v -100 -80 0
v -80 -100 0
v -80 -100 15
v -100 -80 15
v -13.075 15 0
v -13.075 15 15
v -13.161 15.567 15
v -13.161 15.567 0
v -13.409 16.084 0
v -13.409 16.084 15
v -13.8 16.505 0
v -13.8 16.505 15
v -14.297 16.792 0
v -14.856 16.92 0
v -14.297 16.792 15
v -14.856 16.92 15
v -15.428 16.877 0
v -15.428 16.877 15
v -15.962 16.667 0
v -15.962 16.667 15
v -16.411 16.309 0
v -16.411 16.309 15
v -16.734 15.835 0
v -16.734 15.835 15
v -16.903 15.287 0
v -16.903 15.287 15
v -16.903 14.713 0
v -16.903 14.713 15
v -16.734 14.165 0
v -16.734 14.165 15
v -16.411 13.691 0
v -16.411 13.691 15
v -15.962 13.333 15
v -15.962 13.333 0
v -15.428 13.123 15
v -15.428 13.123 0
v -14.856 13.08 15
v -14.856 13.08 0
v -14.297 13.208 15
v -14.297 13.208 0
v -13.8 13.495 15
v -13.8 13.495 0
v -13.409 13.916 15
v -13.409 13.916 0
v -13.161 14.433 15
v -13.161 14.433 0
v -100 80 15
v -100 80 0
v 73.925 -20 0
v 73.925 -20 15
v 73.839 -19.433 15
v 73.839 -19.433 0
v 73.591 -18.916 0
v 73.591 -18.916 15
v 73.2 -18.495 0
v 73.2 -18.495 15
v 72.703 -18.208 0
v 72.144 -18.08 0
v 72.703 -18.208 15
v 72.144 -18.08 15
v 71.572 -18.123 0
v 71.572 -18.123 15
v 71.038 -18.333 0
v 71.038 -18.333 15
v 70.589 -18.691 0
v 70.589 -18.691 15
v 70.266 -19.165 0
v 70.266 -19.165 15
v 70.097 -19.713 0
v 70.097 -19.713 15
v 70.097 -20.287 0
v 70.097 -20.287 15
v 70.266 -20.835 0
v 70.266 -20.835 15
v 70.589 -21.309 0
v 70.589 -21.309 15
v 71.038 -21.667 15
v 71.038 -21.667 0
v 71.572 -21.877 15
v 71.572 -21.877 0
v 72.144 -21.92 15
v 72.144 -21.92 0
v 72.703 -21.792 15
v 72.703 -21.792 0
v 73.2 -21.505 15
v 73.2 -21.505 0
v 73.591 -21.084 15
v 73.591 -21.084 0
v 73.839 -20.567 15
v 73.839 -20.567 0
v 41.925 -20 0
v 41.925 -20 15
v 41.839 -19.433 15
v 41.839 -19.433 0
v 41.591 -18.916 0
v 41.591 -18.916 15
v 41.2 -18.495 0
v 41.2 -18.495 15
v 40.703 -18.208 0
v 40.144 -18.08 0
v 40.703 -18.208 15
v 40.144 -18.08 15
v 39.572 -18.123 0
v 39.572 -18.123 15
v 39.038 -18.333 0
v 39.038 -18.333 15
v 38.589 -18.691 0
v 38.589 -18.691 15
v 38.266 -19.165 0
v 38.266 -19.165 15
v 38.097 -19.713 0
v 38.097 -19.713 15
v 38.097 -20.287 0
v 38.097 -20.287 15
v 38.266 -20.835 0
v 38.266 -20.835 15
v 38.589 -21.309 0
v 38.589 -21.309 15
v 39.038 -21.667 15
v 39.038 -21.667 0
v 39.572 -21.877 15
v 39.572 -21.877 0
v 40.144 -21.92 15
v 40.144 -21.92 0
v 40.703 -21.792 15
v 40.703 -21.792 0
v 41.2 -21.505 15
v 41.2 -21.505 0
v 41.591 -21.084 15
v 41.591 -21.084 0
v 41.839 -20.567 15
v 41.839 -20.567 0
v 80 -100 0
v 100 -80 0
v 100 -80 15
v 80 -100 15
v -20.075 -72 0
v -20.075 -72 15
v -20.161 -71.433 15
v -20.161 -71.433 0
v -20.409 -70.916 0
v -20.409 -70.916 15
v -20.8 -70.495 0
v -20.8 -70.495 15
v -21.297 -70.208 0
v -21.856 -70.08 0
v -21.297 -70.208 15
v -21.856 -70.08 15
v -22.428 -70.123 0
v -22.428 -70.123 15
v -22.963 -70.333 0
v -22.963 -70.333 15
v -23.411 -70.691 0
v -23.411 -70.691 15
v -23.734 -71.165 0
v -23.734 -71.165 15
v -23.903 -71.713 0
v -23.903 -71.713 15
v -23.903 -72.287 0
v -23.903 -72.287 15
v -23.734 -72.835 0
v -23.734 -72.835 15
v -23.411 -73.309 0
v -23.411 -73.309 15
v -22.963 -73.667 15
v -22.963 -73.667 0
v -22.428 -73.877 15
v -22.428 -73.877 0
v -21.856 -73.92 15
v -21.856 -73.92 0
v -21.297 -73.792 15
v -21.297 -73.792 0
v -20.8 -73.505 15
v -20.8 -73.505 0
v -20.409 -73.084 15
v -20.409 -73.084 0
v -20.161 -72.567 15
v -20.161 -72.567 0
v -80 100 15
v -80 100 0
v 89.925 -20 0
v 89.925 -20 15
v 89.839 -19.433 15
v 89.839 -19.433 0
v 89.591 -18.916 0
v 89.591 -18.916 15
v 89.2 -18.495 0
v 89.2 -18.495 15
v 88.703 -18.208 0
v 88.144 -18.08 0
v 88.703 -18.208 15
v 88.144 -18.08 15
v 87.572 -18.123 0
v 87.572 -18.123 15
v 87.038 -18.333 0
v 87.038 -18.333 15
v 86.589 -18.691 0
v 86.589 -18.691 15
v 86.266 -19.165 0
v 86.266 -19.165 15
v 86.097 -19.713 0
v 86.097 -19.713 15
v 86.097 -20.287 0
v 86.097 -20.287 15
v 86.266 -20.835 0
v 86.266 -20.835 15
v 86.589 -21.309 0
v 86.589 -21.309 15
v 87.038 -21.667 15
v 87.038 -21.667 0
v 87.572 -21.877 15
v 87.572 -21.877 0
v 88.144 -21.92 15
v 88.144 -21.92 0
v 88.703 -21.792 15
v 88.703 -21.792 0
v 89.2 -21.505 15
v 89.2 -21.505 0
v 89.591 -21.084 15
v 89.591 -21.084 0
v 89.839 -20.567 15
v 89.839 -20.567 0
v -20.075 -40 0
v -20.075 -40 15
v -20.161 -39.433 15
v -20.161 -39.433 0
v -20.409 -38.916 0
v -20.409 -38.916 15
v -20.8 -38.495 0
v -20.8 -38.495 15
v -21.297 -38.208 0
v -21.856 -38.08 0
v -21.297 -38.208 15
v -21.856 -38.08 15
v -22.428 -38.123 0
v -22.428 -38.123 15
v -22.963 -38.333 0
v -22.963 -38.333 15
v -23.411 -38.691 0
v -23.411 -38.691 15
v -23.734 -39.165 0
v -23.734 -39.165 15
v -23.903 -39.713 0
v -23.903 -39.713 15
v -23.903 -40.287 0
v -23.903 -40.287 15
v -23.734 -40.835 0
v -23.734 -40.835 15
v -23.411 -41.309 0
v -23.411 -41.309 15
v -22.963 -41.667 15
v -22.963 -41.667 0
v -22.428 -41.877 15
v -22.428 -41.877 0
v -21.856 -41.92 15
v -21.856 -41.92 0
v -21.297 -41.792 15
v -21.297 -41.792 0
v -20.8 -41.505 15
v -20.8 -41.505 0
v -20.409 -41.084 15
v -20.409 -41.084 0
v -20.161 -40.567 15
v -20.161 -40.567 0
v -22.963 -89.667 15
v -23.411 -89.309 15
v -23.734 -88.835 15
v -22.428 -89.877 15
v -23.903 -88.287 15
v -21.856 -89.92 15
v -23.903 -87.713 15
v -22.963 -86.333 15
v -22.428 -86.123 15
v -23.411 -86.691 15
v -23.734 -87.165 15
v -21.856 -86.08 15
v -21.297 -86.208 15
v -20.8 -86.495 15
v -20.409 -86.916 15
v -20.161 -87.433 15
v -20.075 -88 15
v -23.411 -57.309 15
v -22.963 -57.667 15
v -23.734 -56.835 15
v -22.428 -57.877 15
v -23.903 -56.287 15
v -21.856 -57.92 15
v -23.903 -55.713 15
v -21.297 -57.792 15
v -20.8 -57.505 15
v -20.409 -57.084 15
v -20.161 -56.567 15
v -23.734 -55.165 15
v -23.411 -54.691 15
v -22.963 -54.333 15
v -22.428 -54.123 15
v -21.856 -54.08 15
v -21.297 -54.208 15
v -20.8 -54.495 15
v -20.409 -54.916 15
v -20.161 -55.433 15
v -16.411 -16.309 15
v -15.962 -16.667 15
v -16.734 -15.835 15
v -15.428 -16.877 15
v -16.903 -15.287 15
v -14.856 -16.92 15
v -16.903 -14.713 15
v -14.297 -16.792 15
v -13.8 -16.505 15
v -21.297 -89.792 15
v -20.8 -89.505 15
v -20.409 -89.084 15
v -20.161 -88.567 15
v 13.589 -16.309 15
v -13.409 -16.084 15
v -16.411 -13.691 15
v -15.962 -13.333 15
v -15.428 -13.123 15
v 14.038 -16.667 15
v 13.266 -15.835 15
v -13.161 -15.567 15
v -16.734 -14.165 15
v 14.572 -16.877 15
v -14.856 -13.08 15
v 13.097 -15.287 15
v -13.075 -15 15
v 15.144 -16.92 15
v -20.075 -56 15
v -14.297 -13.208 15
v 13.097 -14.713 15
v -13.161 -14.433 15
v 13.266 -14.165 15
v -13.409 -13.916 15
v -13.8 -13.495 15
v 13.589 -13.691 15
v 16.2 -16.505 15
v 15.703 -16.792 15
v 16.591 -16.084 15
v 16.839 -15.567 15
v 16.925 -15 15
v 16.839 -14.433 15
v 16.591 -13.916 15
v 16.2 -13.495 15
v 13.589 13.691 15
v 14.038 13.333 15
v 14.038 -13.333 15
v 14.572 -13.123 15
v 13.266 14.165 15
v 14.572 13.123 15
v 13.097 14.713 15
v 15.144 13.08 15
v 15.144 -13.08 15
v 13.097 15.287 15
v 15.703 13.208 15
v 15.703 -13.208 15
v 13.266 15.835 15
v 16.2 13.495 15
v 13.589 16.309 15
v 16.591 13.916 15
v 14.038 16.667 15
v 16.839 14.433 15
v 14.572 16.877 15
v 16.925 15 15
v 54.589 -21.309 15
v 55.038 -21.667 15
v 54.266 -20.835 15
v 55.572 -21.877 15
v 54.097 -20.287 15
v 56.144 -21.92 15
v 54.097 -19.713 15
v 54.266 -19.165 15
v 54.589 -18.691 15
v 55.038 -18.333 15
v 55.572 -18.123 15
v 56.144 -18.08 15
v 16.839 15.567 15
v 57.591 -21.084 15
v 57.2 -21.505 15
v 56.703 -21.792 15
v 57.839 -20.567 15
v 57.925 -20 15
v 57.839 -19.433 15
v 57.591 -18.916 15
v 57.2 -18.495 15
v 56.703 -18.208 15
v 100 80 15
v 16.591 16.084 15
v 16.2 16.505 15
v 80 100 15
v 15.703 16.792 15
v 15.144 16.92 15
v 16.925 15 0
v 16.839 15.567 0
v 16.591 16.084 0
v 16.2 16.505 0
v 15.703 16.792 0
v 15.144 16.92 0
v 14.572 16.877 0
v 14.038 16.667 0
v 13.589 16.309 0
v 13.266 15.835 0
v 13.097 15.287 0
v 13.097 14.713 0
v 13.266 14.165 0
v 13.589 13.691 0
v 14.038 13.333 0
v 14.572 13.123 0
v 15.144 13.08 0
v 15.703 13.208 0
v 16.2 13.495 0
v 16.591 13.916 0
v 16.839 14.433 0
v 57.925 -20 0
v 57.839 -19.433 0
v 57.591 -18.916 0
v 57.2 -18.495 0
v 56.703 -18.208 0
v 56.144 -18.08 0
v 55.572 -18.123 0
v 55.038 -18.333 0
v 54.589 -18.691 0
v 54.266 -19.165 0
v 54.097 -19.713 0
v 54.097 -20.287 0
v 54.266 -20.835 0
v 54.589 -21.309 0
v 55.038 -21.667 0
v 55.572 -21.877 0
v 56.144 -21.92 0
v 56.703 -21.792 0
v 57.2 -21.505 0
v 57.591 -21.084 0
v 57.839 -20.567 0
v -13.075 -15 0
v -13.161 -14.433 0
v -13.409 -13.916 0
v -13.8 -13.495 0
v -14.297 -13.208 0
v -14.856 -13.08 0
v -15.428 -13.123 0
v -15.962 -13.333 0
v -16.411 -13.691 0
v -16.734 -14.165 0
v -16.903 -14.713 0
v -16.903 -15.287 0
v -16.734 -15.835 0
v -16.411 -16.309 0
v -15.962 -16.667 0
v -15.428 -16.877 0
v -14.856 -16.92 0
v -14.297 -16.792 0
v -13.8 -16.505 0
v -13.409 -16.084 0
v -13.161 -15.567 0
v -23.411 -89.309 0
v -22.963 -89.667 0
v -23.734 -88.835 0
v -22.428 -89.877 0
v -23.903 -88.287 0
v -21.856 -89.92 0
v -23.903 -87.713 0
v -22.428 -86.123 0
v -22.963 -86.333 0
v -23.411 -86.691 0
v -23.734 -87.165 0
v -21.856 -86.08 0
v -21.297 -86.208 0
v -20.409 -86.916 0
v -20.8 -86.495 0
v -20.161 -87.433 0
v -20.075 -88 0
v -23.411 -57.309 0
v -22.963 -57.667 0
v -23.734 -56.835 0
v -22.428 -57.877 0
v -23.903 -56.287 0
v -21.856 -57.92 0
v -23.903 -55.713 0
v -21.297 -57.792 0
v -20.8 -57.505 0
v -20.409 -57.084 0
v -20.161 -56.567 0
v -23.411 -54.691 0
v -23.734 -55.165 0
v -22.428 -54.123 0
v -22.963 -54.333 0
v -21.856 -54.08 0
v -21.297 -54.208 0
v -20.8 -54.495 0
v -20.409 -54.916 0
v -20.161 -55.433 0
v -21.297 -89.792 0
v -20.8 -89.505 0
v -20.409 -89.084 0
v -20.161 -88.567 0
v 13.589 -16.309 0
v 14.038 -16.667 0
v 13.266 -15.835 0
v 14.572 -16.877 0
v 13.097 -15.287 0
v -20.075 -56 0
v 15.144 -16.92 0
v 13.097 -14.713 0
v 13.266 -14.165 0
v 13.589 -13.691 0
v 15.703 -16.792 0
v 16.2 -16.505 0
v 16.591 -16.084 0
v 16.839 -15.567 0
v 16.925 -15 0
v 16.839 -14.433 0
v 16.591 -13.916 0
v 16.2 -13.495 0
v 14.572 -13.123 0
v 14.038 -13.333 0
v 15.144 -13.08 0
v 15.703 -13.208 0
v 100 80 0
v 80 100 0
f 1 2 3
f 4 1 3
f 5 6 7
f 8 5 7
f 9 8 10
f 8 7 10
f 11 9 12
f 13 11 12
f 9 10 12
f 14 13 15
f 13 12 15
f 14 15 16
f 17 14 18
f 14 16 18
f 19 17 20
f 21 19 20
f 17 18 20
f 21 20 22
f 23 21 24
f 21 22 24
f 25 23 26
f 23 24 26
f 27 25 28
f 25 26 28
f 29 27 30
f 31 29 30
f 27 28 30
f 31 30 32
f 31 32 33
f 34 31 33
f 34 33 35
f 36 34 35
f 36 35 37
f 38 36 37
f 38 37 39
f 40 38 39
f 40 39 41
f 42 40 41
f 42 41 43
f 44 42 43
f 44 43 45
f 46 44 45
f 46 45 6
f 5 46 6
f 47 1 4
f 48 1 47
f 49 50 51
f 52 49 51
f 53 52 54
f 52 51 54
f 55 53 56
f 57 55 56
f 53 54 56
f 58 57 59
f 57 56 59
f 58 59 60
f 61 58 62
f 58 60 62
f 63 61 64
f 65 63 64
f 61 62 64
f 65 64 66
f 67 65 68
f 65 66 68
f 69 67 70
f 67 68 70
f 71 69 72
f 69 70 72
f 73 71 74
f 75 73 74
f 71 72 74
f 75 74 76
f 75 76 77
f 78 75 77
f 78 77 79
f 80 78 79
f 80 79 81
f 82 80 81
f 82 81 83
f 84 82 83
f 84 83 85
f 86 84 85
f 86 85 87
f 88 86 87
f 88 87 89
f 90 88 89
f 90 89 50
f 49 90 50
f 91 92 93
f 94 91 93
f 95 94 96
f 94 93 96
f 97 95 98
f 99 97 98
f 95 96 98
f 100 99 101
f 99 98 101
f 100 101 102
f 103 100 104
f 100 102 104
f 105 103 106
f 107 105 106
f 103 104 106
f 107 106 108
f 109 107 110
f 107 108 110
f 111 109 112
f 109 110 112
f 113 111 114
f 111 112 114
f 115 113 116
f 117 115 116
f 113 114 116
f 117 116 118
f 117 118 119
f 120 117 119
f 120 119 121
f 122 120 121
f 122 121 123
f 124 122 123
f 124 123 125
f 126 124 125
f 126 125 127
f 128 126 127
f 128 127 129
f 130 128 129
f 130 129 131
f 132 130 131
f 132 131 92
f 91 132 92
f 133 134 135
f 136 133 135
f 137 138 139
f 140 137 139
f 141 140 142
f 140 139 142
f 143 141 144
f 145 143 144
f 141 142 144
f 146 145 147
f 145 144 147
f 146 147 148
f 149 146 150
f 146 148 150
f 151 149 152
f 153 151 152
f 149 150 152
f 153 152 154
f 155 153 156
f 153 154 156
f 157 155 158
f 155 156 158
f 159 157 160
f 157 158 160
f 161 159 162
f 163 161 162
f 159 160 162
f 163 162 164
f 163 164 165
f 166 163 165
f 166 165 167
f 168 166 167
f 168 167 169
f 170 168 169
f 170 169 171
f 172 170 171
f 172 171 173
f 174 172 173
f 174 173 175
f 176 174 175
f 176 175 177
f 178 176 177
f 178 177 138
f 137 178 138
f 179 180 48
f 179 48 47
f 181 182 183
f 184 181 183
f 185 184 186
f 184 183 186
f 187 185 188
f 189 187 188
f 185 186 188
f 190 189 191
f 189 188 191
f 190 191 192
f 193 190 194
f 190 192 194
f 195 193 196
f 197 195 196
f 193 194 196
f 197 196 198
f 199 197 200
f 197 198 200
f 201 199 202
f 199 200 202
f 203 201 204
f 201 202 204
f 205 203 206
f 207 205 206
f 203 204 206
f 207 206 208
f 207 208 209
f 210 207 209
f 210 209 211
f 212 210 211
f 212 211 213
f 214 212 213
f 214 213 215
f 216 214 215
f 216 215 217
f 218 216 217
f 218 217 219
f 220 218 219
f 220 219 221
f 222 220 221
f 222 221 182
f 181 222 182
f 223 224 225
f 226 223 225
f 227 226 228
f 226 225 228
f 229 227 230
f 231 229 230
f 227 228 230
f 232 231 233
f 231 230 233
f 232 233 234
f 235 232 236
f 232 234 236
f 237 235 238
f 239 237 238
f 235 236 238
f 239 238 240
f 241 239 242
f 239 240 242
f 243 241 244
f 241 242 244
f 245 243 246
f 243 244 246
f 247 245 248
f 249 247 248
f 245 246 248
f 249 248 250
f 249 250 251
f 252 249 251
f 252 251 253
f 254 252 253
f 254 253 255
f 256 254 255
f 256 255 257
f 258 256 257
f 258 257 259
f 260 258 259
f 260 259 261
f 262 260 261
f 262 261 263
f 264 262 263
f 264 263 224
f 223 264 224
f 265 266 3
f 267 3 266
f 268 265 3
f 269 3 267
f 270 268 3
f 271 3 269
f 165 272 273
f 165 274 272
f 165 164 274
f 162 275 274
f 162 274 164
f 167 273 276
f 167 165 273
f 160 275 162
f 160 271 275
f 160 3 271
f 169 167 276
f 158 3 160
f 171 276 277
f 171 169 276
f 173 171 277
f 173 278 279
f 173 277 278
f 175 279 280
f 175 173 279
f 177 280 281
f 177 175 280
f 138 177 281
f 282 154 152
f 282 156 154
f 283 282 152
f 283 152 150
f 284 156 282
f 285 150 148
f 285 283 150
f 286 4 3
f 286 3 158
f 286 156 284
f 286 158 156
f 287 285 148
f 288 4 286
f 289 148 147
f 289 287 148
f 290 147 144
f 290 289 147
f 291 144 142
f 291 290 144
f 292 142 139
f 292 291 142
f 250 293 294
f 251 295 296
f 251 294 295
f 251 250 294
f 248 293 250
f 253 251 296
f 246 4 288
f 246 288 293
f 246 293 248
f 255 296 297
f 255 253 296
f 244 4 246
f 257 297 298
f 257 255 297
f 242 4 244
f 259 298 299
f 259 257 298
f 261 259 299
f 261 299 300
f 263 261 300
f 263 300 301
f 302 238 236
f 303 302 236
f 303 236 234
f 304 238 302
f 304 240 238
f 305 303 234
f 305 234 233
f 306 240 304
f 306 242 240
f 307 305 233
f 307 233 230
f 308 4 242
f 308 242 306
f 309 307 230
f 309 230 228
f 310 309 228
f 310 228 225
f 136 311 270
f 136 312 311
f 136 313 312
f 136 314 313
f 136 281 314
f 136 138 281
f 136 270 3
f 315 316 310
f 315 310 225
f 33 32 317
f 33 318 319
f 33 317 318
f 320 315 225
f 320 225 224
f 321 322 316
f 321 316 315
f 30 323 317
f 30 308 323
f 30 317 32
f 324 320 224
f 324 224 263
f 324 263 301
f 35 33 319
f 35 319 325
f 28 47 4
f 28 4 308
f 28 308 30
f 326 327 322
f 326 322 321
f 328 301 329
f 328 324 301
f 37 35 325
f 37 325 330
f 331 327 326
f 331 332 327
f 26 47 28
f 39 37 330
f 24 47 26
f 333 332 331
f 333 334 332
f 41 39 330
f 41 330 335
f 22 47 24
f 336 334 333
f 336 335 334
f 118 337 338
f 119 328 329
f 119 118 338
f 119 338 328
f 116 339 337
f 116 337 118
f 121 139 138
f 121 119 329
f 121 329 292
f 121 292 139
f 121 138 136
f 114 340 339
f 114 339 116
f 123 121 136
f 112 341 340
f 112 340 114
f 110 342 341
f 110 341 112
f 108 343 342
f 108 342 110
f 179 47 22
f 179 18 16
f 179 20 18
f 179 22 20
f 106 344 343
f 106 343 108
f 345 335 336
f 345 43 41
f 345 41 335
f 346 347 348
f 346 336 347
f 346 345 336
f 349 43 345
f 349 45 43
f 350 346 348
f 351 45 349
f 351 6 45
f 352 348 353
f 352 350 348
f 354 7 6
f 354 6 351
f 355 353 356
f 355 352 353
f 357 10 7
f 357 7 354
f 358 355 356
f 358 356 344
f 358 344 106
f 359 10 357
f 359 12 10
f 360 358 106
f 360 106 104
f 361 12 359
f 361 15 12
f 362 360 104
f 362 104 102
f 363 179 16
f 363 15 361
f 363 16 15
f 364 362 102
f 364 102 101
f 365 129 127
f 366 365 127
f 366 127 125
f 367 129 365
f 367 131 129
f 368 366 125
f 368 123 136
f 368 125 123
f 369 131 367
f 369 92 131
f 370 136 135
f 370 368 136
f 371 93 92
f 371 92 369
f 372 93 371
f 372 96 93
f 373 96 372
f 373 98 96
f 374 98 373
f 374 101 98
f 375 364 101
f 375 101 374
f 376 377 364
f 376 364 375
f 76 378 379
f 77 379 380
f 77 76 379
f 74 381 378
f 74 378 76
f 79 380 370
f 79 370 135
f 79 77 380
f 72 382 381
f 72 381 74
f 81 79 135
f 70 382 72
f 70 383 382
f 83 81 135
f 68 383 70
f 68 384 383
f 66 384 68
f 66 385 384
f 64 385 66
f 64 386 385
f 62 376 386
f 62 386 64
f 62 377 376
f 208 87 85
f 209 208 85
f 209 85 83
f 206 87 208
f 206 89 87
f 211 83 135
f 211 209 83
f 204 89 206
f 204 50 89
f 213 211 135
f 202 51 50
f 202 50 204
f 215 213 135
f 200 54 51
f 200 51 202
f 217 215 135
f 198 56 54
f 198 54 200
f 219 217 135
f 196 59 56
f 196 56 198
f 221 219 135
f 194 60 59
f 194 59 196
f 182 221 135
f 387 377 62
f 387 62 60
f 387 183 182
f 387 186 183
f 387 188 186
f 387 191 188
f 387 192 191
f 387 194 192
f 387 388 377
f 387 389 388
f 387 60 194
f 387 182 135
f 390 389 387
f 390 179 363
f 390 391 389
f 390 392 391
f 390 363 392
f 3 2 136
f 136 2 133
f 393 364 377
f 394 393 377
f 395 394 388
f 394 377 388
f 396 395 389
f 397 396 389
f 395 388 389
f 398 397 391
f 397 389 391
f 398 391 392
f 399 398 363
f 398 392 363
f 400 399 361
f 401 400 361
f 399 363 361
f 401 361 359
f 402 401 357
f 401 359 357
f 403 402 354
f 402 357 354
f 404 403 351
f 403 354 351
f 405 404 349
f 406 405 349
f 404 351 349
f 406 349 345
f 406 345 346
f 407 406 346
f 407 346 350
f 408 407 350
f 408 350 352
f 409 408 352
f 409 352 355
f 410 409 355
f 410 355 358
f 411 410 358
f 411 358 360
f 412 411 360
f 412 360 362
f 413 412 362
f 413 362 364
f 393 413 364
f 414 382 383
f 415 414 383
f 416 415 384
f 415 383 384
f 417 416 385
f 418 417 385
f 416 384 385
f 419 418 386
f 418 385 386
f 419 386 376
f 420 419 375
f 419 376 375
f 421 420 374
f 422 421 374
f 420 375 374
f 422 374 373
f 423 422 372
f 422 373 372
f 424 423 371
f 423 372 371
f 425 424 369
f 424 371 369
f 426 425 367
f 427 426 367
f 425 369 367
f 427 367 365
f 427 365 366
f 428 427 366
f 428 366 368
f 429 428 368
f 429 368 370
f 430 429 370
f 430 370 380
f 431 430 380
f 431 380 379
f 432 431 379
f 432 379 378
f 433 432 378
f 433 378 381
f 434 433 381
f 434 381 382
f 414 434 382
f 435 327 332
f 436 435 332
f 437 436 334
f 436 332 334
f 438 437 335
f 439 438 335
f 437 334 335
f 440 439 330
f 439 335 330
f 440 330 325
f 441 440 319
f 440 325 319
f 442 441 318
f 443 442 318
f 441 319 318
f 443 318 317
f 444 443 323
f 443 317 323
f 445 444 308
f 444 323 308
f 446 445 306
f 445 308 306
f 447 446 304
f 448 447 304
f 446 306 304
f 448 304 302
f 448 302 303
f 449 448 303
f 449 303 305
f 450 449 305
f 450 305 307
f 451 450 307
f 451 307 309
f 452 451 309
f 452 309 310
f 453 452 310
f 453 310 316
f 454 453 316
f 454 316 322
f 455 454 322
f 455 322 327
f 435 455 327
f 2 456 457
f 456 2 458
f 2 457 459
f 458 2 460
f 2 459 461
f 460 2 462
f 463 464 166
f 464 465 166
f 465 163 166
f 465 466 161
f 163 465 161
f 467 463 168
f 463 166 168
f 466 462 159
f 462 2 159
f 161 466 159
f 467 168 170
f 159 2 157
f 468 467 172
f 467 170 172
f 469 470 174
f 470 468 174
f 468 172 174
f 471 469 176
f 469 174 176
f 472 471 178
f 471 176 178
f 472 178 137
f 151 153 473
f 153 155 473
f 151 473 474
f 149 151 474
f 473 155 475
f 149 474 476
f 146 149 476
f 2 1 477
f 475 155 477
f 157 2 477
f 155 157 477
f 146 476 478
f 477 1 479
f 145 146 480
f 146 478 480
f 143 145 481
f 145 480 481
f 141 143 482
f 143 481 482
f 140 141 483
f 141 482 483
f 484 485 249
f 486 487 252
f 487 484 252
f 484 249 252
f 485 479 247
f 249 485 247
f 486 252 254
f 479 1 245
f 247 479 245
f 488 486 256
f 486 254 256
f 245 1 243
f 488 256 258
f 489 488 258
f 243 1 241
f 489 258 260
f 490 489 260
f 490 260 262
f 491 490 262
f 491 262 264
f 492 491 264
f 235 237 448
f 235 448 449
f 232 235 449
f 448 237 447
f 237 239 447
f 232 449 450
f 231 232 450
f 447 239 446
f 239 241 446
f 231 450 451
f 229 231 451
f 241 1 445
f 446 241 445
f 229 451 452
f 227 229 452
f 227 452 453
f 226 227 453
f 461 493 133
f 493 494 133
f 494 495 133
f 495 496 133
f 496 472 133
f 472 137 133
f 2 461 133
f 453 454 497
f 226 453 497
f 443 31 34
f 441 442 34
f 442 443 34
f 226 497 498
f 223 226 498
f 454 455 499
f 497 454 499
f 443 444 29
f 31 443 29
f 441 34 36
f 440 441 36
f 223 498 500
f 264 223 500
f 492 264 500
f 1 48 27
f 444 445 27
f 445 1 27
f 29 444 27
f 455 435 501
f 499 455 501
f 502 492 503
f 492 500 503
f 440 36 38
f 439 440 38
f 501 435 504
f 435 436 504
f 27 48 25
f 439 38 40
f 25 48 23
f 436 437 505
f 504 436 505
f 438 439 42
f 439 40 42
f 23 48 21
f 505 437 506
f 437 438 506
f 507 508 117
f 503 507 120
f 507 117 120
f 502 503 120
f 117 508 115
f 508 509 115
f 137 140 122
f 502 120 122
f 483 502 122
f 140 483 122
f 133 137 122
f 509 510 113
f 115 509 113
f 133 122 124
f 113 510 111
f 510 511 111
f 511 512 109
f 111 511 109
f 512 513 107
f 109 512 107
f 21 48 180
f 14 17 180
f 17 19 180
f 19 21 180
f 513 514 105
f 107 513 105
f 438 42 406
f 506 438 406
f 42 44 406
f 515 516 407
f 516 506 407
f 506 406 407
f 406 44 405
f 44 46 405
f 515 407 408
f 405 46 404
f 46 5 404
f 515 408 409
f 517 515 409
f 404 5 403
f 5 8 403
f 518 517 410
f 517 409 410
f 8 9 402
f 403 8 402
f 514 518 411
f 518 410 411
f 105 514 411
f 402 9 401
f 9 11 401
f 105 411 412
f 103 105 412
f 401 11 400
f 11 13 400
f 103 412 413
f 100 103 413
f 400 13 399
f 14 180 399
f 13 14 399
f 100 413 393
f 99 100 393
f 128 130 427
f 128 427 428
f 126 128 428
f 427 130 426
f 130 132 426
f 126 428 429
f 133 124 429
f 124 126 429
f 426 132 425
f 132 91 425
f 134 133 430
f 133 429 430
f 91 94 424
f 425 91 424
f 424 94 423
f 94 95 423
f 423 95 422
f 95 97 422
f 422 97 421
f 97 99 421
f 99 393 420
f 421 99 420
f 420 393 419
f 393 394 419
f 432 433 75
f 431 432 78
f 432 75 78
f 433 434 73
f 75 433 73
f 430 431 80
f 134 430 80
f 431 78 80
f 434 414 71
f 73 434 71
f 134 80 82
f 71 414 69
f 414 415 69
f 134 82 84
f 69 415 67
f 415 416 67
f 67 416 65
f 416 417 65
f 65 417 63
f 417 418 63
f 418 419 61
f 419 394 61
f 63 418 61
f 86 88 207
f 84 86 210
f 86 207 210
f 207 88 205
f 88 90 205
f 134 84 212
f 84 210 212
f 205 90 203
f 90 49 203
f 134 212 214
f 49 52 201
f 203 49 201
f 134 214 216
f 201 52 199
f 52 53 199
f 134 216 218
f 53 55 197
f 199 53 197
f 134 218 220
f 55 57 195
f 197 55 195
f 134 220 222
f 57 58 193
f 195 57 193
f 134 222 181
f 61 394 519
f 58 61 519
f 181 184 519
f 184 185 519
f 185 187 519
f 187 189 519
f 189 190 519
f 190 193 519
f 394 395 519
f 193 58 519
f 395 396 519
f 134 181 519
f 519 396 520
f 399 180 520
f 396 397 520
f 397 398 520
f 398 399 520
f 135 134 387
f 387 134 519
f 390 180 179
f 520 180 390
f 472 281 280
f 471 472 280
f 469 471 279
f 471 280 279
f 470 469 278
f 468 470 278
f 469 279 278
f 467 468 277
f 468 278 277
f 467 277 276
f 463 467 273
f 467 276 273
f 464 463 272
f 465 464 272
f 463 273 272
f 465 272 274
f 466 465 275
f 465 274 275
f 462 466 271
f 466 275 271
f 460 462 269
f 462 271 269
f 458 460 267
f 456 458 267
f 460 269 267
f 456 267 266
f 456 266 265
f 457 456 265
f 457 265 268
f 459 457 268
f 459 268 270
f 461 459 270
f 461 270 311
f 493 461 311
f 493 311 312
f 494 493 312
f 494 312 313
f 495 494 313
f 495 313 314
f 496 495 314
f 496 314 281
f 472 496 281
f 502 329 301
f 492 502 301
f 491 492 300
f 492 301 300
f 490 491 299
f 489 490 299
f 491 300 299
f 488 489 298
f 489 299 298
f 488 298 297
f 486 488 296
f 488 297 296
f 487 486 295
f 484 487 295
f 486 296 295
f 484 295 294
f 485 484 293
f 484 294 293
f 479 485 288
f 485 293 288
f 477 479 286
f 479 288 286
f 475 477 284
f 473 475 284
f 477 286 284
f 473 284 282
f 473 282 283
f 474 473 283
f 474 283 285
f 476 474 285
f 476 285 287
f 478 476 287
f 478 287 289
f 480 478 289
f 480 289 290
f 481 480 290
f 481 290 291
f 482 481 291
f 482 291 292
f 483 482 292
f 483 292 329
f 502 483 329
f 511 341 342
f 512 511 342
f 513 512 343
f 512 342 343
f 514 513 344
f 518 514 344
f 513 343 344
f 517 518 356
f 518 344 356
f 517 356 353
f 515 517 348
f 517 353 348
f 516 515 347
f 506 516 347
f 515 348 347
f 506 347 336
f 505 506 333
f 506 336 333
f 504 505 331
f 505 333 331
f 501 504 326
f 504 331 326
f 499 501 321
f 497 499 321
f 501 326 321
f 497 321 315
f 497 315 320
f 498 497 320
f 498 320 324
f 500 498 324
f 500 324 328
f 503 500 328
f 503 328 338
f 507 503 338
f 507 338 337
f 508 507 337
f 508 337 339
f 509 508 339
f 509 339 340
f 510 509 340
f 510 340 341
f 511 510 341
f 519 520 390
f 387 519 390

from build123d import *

# Parameters (mm, degrees)
SKETCH2_W           = 200
SKETCH2_H           = 200
BOSS_EXTRUDE1_DEPTH = 15
CHAMFER1_SIZE       = 20
SKETCH3_R           = 1.925
CUT_EXTRUDE1_DEPTH  = 16
SKETCH4_R           = 1.925
CUT_EXTRUDE2_DEPTH  = 16
SKETCH5_R           = 1.925
CUT_EXTRUDE3_DEPTH  = 16


with BuildPart() as part:
    # Sketch2 → Boss-Extrude1 (new body)
    with BuildSketch(Plane.XY):
        Rectangle(SKETCH2_W, SKETCH2_H)
    extrude(amount=BOSS_EXTRUDE1_DEPTH)

    # Chamfer1
    chamfer1_edges = [part.edges().sort_by_distance(p)[0] for p in [
        (100, -100, 7.5),
        (-100, -100, 7.5),
        (-100, 100, 7.5),
        (100, 100, 7.5),
    ]]
    chamfer(chamfer1_edges, length=CHAMFER1_SIZE)

    # Sketch3 → Cut-Extrude1 (cut, through all)
    with BuildSketch(Plane.XY.offset(15)):
        with Locations((-22, -88)):
            Circle(SKETCH3_R)
        with Locations((-22, -72)):
            Circle(SKETCH3_R)
        with Locations((-22, -56)):
            Circle(SKETCH3_R)
        with Locations((-22, -40)):
            Circle(SKETCH3_R)
    extrude(amount=-CUT_EXTRUDE1_DEPTH, mode=Mode.SUBTRACT)

    # Sketch4 → Cut-Extrude2 (cut, through all)
    with BuildSketch(Plane.XY.offset(15)):
        with Locations((88, -20)):
            Circle(SKETCH4_R)
        with Locations((72, -20)):
            Circle(SKETCH4_R)
        with Locations((56, -20)):
            Circle(SKETCH4_R)
        with Locations((40, -20)):
            Circle(SKETCH4_R)
    extrude(amount=-CUT_EXTRUDE2_DEPTH, mode=Mode.SUBTRACT)

    # Sketch5 → Cut-Extrude3 (cut, through all)
    with BuildSketch(Plane.XY.offset(15)):
        with Locations((15, 15)):
            Circle(SKETCH5_R)
        with Locations((15, -15)):
            Circle(SKETCH5_R)
        with Locations((-15, -15)):
            Circle(SKETCH5_R)
        with Locations((-15, 15)):
            Circle(SKETCH5_R)
    extrude(amount=-CUT_EXTRUDE3_DEPTH, mode=Mode.SUBTRACT)


solid = part.part
